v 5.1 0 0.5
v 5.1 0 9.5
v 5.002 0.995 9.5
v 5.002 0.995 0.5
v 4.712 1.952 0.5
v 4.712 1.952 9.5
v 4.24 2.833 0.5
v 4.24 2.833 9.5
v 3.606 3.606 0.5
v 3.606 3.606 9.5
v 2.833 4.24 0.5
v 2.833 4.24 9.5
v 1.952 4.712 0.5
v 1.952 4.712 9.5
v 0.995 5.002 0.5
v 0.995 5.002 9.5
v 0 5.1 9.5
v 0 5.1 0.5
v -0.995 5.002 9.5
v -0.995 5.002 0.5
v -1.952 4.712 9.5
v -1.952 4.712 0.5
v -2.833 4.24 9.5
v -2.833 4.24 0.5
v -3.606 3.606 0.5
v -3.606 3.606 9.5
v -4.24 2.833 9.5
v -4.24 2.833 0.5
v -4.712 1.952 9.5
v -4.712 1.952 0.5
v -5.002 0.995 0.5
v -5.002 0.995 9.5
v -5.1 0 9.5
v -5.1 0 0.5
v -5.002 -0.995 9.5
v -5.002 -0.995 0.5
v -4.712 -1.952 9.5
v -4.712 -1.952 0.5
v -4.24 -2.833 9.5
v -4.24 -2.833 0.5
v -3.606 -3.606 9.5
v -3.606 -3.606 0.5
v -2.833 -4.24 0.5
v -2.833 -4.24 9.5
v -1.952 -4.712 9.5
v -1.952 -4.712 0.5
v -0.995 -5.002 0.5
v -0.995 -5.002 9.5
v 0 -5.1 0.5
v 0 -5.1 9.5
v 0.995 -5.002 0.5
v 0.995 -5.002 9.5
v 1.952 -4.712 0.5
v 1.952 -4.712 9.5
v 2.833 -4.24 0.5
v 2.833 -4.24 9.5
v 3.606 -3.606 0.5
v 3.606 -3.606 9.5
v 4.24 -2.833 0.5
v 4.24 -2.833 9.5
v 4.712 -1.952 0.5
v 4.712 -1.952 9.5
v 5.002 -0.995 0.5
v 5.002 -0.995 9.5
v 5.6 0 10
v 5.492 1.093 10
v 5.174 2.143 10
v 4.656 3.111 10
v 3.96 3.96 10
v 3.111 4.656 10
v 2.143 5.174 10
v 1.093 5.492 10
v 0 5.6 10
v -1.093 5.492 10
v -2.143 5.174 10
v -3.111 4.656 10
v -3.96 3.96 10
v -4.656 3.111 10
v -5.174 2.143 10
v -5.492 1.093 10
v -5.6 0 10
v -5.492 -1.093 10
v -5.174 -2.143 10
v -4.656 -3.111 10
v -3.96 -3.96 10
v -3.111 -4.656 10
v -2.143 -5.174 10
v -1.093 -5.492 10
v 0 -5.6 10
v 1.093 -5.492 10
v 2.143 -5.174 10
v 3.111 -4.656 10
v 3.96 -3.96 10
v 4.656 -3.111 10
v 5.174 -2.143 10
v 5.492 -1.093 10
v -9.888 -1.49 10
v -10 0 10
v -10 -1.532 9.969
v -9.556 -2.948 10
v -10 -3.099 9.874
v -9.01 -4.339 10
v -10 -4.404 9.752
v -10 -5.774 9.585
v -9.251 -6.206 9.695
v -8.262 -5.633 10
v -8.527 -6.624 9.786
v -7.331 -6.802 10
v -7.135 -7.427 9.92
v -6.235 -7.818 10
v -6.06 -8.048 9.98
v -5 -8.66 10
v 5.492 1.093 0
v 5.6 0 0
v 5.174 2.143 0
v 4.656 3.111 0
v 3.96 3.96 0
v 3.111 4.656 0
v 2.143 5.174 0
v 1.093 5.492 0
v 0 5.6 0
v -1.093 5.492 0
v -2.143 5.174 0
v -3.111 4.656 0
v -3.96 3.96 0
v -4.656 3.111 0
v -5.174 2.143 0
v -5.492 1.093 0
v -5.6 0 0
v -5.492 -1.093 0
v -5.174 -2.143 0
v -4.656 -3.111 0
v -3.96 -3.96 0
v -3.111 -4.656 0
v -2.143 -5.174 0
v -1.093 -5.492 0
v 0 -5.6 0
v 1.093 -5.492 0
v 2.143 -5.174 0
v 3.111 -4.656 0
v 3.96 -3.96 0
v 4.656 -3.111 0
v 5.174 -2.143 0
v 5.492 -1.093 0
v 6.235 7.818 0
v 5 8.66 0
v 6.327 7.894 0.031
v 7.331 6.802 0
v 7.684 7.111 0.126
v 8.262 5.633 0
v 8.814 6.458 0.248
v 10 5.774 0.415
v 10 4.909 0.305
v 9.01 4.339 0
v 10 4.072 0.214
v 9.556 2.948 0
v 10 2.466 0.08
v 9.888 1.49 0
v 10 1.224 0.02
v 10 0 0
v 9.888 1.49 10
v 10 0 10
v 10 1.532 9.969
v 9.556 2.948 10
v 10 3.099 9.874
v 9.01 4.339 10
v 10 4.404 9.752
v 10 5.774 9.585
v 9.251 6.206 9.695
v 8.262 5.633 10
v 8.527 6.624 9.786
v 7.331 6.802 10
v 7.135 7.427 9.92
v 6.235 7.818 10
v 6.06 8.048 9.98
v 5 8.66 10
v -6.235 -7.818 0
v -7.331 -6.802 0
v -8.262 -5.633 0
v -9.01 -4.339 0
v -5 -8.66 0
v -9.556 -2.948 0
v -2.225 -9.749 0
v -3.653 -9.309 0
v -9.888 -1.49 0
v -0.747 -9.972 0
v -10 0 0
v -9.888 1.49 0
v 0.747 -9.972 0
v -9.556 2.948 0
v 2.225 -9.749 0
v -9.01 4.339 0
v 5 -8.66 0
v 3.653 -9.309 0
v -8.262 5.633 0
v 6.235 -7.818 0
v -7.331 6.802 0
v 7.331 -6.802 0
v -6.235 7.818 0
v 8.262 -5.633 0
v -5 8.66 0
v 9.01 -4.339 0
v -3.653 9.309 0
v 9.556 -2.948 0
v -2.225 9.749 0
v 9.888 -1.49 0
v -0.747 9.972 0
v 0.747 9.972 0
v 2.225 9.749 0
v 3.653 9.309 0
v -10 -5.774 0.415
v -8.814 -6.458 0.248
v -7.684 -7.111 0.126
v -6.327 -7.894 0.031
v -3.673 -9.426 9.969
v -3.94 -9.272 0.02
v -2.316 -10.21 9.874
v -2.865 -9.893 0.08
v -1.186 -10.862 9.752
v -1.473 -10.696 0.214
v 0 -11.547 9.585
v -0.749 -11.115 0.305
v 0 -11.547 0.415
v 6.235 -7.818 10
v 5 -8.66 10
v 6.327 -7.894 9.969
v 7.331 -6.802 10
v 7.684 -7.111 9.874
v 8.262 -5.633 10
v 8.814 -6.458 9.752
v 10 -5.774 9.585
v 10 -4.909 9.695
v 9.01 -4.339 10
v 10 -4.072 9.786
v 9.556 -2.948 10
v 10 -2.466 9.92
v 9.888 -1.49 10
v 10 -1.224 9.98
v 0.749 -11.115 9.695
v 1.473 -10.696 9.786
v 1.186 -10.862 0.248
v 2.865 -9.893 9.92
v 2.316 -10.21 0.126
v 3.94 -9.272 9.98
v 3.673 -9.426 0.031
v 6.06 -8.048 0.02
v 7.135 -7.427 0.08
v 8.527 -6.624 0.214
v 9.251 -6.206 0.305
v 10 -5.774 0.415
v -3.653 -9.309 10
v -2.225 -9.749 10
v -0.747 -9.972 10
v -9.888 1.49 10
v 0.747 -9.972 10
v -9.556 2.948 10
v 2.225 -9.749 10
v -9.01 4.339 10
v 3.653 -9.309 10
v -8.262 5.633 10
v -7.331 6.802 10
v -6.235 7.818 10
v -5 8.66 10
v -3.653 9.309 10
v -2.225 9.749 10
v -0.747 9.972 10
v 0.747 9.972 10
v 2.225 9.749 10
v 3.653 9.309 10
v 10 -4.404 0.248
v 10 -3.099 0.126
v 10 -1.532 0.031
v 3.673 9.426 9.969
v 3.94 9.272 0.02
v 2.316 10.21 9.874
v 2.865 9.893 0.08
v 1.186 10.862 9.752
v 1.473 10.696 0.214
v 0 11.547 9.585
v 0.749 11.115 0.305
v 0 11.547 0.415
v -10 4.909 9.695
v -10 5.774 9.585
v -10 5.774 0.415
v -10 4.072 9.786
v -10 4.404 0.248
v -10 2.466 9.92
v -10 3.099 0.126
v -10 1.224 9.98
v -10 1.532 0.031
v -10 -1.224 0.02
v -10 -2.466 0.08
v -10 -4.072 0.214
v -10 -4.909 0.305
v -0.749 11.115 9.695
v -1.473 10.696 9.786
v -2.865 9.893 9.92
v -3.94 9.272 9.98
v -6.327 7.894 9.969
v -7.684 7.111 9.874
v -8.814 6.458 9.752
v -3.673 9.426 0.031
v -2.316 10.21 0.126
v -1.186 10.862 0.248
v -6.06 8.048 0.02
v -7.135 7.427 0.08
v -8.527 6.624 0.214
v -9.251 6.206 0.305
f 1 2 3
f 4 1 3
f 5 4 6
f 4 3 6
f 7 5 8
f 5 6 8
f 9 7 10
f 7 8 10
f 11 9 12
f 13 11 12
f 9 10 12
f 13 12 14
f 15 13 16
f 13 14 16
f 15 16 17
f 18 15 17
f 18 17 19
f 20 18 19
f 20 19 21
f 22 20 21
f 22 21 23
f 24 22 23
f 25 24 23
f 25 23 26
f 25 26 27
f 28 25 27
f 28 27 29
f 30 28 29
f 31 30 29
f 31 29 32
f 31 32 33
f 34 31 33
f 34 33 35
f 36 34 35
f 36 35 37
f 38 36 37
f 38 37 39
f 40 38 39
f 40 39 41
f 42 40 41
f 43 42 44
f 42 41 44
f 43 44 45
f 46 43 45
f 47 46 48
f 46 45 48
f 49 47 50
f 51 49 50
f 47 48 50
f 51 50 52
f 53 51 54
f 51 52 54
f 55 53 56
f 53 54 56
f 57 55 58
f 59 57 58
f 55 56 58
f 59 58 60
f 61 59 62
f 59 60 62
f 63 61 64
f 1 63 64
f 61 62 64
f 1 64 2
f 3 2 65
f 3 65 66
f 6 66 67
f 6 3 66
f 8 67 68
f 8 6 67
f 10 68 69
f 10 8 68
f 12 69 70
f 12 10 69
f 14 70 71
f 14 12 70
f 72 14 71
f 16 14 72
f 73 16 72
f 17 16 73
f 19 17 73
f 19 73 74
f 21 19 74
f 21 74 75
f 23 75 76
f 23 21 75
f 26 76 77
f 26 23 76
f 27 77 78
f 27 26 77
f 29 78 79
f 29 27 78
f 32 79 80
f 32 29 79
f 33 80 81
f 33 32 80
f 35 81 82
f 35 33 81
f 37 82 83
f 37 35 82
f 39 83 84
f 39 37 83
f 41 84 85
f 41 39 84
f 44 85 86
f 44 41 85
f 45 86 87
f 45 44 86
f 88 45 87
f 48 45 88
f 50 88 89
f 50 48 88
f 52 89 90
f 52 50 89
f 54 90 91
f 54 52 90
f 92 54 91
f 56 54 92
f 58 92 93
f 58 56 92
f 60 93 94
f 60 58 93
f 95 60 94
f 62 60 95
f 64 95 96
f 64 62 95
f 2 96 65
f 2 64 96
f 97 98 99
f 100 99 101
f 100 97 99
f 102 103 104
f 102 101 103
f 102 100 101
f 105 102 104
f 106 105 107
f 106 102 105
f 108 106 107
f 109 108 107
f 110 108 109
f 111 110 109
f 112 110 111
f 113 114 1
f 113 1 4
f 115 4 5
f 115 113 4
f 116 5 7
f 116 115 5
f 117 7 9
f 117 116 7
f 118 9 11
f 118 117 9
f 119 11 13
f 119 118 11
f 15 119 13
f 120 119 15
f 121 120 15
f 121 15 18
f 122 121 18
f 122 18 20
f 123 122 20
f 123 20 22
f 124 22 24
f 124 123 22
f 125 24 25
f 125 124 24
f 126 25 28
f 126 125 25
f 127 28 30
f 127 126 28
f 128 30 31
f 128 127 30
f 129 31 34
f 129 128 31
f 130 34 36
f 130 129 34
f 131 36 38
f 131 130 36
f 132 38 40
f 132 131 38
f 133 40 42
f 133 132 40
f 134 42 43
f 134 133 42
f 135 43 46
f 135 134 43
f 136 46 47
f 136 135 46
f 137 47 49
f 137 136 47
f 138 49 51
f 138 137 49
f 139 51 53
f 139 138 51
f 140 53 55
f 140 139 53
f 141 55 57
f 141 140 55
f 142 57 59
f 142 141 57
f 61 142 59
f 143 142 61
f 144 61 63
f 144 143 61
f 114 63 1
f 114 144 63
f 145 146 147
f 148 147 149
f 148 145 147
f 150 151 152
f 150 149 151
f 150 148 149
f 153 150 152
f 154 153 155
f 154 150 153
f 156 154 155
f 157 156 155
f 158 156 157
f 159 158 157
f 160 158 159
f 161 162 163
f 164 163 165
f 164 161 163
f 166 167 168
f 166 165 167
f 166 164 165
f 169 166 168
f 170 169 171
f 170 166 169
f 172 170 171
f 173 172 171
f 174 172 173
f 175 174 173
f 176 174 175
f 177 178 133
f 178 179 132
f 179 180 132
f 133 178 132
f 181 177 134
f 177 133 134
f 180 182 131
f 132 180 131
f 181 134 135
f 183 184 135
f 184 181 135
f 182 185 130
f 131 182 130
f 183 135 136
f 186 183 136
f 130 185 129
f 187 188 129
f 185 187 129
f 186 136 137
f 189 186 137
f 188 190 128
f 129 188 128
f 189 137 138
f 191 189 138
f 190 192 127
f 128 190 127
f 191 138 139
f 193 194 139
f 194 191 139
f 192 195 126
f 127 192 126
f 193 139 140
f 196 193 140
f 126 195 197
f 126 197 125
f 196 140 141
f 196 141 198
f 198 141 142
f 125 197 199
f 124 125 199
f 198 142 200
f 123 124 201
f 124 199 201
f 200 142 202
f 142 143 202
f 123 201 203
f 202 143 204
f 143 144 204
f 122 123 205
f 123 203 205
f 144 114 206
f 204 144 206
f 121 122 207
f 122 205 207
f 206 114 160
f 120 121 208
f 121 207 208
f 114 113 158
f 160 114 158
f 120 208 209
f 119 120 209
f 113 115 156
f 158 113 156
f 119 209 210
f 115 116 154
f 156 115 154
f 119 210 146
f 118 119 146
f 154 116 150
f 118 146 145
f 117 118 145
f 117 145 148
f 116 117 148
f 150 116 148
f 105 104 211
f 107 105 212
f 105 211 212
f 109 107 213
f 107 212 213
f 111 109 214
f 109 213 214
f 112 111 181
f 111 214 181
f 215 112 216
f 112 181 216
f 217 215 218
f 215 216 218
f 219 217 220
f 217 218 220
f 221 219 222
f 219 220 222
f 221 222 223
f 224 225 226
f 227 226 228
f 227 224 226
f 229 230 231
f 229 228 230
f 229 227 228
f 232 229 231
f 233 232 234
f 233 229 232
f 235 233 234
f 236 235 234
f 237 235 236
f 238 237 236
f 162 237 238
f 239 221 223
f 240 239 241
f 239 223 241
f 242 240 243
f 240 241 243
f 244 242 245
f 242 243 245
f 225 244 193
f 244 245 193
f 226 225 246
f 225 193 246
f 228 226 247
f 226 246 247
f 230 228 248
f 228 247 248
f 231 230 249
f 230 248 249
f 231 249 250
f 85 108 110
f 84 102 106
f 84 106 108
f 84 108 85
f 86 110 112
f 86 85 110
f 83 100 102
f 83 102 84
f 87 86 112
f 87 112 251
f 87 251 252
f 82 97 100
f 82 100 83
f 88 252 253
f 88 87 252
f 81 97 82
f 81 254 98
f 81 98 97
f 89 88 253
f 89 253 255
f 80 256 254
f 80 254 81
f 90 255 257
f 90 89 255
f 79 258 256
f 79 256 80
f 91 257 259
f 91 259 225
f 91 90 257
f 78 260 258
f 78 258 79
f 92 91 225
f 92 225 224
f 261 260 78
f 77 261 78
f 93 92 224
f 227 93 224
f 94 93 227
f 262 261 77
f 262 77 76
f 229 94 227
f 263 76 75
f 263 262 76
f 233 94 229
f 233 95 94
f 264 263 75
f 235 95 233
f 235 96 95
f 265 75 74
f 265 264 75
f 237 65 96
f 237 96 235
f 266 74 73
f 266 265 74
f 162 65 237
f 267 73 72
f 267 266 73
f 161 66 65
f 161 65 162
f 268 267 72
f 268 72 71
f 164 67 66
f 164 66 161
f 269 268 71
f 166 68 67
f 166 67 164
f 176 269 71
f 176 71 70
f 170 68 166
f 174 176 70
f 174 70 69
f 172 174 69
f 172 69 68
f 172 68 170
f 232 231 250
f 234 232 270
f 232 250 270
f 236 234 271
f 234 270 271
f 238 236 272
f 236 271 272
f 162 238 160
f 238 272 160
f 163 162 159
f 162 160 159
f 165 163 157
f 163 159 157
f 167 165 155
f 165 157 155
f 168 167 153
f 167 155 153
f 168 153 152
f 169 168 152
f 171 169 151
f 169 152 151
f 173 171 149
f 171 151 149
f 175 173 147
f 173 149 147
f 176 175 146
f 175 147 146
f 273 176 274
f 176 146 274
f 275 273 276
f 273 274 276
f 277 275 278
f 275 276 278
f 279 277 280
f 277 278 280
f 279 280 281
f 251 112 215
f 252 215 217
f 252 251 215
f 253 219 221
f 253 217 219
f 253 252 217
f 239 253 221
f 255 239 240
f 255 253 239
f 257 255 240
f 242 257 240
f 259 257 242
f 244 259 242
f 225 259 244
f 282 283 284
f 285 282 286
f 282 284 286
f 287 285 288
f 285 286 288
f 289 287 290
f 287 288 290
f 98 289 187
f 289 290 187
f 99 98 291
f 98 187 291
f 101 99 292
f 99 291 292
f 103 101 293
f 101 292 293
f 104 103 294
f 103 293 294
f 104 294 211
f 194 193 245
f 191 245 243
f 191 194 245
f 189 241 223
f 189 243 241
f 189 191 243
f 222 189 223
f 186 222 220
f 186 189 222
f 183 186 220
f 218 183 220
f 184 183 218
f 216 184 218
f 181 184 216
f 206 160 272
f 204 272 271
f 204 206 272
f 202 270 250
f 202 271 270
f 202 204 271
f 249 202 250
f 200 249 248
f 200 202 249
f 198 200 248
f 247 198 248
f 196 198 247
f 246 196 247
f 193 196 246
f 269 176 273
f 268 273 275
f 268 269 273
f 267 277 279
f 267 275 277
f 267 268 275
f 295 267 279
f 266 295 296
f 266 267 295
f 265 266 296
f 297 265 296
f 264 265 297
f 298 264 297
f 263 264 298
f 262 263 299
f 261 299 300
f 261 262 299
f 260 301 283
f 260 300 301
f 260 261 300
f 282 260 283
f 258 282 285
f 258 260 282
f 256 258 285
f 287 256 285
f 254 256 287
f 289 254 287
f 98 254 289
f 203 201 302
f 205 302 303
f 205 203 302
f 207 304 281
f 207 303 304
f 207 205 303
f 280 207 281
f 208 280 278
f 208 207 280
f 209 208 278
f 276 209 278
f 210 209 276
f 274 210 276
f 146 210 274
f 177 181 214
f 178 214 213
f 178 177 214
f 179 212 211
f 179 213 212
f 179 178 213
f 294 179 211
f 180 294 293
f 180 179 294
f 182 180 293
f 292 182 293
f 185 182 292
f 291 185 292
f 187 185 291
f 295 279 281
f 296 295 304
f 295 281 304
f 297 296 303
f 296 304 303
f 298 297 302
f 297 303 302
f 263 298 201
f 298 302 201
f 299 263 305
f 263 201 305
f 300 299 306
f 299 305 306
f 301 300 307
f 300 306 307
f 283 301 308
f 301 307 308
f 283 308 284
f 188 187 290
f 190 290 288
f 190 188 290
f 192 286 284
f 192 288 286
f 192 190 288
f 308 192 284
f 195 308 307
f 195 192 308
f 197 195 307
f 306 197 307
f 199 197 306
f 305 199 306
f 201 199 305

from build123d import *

# Parameters (mm, degrees)
RESSALTO_EXTRUS_O1_DEPTH = 10
ESBO_O2_OUTSIDE_W        = 140.39
ESBO_O2_OUTSIDE_H        = 143.484
ESBO_O2_OUTSIDE_R        = 10
CORTE_EXTRUS_O1_DEPTH    = 15
CORTE_EXTRUS_O1_DRAFT    = -75
ESBO_O3_OUTSIDE_W        = 140.39
ESBO_O3_OUTSIDE_H        = 143.484
ESBO_O3_OUTSIDE_R        = 10
CORTE_EXTRUS_O2_DEPTH    = 15
CORTE_EXTRUS_O2_DRAFT    = -75
FURO_ROSCADO_DE_M121_D   = 10.2
CHANFRO3_SIZE            = 0.5
CHANFRO4_SIZE            = 0.5


with BuildPart() as part:
    # Esboço1 → Ressalto-extrusão1 (new body)
    with BuildSketch(Plane.XY):
        Polygon((0, 11.547005384), (-10, 5.773502692), (-10, -5.773502692), (0, -11.547005384), (10, -5.773502692), (10, 5.773502692), align=None)
    extrude(amount=RESSALTO_EXTRUS_O1_DEPTH)


with BuildPart() as corte_extrus_o1_tool:
    # Esboço2 outside → Corte-extrusão1 (with draft: the straight prism first)
    with BuildSketch(Plane.XY.offset(10)):
        Rectangle(ESBO_O2_OUTSIDE_W, ESBO_O2_OUTSIDE_H)
        Circle(ESBO_O2_OUTSIDE_R, mode=Mode.SUBTRACT)
    extrude(amount=-CORTE_EXTRUS_O1_DEPTH)
    # Corte-extrusão1: the draft: its side faces are tilted about the plane it starts from
    corte_extrus_o1_sides = [corte_extrus_o1_tool.faces().sort_by_distance(p)[0] for p in [
        (0, -71.742, 2.5),
        (70.195, 0, 2.5),
        (0, 71.742, 2.5),
        (-70.195, 0, 2.5),
        (-10, 0, 2.5),
    ]]
    draft(corte_extrus_o1_sides, Plane.XY.offset(10), CORTE_EXTRUS_O1_DRAFT)


with BuildPart() as part_1:
    add(part.part)

    # Corte-extrusão1: cut by corte_extrus_o1_tool
    add(corte_extrus_o1_tool.part, mode=Mode.SUBTRACT)


with BuildPart() as corte_extrus_o2_tool:
    # Esboço3 outside → Corte-extrusão2 (with draft: the straight prism first)
    with BuildSketch(Plane(origin=(0, 0, 0), x_dir=(-1, 0, 0), z_dir=(0, 0, -1))):
        Rectangle(ESBO_O3_OUTSIDE_W, ESBO_O3_OUTSIDE_H)
        Circle(ESBO_O3_OUTSIDE_R, mode=Mode.SUBTRACT)
    extrude(amount=-CORTE_EXTRUS_O2_DEPTH)
    # Corte-extrusão2: the draft: its side faces are tilted about the plane it starts from
    corte_extrus_o2_sides = [corte_extrus_o2_tool.faces().sort_by_distance(p)[0] for p in [
        (0, -71.742, 7.5),
        (-70.195, 0, 7.5),
        (0, 71.742, 7.5),
        (70.195, 0, 7.5),
        (10, 0, 7.5),
    ]]
    draft(corte_extrus_o2_sides, Plane(origin=(0, 0, 0), x_dir=(-1, 0, 0), z_dir=(0, 0, -1)), CORTE_EXTRUS_O2_DRAFT)


with BuildPart() as part_2:
    add(part_1.part)

    # Corte-extrusão2: cut by corte_extrus_o2_tool
    add(corte_extrus_o2_tool.part, mode=Mode.SUBTRACT)

    # Furo roscado de M121 (through all)
    with Locations(Plane(origin=(0, 0, 0), x_dir=(-1, 0, 0), z_dir=(0, 0, -1))):
        with Locations((0, 0)):
            Hole(FURO_ROSCADO_DE_M121_D / 2)

    # Chanfro3
    chanfro3_edges = [part_2.edges().sort_by_distance(p)[0] for p in [
        (-5.1, 0, 10),
    ]]
    chamfer(chanfro3_edges, length=CHANFRO3_SIZE)

    # Chanfro4
    chanfro4_edges = [part_2.edges().sort_by_distance(p)[0] for p in [
        (-5.1, 0, 0),
    ]]
    chamfer(chanfro4_edges, length=CHANFRO4_SIZE)


solid = part_2.part
